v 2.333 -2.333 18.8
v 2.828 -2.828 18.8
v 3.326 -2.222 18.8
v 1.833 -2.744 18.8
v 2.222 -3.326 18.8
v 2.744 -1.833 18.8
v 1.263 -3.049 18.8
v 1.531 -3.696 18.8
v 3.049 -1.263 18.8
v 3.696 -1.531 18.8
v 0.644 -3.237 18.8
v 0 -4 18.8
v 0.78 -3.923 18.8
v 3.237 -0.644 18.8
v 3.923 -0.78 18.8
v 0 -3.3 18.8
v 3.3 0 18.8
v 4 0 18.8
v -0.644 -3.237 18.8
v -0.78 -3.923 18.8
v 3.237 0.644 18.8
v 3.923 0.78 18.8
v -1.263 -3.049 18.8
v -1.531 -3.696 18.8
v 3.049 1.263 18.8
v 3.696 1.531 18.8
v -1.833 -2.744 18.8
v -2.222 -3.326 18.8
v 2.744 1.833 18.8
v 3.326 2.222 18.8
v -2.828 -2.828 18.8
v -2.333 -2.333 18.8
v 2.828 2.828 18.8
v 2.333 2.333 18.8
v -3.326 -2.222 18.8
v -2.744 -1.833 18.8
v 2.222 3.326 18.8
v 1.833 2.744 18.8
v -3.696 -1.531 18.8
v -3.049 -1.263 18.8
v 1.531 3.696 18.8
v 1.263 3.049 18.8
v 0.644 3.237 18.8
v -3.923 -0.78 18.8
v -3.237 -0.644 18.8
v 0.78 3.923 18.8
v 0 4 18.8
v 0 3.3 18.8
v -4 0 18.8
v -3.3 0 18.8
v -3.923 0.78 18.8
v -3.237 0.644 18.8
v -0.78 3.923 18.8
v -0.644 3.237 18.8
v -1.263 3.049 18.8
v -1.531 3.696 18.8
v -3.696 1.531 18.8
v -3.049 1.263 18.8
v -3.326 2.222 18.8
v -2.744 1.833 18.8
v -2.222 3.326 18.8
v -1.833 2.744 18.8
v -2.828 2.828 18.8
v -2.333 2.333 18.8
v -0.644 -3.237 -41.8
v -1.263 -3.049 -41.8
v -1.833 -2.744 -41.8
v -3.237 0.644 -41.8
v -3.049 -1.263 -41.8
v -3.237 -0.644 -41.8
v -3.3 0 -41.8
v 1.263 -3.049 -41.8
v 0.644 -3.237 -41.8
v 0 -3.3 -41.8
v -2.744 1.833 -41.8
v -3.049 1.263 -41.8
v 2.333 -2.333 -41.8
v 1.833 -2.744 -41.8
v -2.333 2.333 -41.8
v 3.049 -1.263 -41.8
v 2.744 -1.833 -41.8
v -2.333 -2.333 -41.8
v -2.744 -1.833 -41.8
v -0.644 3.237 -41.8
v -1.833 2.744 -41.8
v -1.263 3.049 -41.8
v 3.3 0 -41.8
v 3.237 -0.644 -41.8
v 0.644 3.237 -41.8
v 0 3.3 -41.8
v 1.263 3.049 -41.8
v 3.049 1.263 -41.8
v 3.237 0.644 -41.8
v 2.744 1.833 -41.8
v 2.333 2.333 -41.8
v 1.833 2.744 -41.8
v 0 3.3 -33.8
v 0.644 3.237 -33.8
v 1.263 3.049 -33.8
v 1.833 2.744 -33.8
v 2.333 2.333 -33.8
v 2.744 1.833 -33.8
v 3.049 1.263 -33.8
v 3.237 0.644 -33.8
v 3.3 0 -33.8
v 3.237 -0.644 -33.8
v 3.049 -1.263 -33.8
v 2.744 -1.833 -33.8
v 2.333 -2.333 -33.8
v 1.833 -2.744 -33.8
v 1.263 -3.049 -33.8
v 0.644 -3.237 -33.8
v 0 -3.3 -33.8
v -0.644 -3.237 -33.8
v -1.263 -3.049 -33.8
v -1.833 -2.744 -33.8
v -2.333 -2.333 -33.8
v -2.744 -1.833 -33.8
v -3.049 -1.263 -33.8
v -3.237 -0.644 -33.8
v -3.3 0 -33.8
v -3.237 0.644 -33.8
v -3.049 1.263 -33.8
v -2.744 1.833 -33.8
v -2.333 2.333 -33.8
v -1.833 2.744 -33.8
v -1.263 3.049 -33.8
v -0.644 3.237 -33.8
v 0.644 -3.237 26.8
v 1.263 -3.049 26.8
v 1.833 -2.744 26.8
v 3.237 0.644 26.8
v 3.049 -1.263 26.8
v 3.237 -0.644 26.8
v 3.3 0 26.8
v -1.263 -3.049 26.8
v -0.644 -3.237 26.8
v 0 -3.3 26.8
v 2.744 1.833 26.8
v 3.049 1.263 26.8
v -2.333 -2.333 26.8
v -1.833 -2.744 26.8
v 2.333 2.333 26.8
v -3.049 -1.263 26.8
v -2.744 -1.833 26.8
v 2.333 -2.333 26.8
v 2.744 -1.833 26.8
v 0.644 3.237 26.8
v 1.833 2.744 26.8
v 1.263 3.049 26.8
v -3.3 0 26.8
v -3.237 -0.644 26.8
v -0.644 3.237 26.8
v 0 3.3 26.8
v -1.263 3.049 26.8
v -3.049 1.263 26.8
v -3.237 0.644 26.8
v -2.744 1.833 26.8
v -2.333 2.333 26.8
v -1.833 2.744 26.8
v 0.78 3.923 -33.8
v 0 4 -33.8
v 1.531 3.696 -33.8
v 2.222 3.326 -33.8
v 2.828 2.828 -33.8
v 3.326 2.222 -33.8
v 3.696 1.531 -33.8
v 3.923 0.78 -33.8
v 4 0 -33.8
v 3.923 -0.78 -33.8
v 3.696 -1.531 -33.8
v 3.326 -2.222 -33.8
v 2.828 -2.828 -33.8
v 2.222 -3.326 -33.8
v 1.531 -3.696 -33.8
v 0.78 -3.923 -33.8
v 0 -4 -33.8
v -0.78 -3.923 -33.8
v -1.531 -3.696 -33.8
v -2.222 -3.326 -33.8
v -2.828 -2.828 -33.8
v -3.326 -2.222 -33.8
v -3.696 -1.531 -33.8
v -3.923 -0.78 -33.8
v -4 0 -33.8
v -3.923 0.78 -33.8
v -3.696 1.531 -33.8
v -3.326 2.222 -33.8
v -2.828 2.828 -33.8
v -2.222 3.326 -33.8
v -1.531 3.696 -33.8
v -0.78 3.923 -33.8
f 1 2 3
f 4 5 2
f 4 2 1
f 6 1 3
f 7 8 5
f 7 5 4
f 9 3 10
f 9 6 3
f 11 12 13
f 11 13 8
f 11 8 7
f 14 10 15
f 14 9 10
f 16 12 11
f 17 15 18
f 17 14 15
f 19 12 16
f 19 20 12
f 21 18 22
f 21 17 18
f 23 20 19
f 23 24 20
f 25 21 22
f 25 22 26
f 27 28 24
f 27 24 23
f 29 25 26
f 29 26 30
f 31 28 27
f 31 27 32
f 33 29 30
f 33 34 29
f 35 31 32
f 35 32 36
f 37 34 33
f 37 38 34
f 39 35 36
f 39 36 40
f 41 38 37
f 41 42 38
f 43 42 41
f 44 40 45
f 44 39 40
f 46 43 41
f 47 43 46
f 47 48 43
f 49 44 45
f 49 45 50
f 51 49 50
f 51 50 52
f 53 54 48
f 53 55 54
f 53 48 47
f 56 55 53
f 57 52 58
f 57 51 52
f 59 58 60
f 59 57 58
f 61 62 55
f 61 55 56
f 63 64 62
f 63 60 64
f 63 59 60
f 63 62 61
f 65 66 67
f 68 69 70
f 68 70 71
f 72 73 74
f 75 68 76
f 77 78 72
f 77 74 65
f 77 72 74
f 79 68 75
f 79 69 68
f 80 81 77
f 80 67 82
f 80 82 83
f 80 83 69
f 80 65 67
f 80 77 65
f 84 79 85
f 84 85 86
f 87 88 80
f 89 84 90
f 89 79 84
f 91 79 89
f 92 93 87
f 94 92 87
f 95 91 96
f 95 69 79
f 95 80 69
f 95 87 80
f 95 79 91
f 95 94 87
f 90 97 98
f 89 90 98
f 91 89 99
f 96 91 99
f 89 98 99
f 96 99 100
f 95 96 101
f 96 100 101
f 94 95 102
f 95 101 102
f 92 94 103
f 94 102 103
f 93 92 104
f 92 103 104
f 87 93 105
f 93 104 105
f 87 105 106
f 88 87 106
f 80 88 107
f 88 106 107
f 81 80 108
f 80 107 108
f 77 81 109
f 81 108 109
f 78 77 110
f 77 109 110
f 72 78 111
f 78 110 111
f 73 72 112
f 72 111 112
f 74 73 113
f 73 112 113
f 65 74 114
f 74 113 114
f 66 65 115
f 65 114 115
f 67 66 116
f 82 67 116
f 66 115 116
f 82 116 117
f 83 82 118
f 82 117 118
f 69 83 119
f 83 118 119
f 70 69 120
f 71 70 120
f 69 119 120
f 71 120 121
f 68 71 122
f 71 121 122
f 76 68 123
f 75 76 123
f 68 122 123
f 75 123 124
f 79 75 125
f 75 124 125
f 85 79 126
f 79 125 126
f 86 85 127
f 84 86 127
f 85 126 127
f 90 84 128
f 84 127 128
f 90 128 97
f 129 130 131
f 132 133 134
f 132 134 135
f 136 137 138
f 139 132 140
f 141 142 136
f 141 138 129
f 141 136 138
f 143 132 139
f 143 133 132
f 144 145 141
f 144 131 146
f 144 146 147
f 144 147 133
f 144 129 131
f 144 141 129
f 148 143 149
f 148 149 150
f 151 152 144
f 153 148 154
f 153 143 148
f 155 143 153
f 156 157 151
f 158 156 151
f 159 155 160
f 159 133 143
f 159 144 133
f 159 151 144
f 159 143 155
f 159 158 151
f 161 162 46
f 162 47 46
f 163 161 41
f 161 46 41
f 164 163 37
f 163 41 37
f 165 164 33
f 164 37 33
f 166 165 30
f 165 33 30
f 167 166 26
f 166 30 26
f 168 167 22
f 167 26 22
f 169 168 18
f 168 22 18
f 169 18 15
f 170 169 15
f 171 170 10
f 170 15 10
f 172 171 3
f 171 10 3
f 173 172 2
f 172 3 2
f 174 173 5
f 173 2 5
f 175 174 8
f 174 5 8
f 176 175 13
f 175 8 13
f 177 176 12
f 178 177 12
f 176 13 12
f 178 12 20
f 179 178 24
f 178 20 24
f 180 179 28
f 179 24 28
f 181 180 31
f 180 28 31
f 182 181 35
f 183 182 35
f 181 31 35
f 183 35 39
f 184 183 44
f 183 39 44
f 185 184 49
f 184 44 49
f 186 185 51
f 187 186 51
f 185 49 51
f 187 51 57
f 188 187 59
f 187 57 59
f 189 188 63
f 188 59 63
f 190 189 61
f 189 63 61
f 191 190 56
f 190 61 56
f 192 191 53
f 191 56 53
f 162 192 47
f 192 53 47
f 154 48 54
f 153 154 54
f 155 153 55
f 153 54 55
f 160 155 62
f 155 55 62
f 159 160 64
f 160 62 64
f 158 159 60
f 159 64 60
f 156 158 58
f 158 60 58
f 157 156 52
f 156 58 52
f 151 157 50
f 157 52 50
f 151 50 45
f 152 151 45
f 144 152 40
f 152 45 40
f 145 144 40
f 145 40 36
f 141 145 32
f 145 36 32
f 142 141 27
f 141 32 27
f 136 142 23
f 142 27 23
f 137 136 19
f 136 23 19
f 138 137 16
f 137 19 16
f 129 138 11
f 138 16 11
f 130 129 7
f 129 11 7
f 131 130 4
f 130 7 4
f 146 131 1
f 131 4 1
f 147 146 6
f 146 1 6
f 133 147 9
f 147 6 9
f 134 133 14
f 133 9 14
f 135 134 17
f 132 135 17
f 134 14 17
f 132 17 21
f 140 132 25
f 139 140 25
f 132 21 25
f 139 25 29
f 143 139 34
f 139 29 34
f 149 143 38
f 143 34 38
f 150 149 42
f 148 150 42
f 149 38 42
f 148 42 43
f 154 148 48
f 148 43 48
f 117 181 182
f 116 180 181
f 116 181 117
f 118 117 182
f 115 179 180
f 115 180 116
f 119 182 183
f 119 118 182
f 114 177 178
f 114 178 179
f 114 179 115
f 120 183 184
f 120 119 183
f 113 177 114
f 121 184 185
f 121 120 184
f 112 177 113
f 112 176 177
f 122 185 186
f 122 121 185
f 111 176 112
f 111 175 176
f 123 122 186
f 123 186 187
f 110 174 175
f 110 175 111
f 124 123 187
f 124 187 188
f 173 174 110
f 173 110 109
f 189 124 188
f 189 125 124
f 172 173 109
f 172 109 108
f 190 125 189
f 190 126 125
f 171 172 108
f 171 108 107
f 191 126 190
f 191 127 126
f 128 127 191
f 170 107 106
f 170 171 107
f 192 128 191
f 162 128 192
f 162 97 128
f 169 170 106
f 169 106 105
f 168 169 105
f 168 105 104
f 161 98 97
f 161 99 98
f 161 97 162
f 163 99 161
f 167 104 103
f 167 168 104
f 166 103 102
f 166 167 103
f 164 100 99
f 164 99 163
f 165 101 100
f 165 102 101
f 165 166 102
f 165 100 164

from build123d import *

# Parameters (mm, degrees)
SKETCH042_R       = 4
PAD018_DEPTH      = 18.8
SKETCH045_R       = 3.3
PAD019_DEPTH      = 8
SKETCH050_R       = 4
PAD021_DEPTH      = 33.8
CYLINDER003_R     = 3.3
CYLINDER003_DEPTH = 8


with BuildPart() as part:
    # Sketch042 (on DatumPlane) → Pad018 (new body)
    with BuildSketch(Plane(origin=(0, 0, 18.8), x_dir=(0, 1, 0), z_dir=(0, 0, 1))):
        Circle(SKETCH042_R)
    extrude(amount=-PAD018_DEPTH)

    # Sketch045 (on Face2 of Pad018) → Pad019 (join)
    with BuildSketch(Plane(origin=(0, 0, 18.8), x_dir=(0, 1, 0), z_dir=(0, 0, 1))):
        Circle(SKETCH045_R)
    extrude(amount=PAD019_DEPTH)

    # Sketch050 (on Face3 of Pad019) → Pad021 (join)
    with BuildSketch(Plane.YX):
        Circle(SKETCH050_R)
    extrude(amount=PAD021_DEPTH)

    # Cylinder003 → Cylinder003 (join)
    with BuildSketch(Plane.YX.offset(33.8)):
        Circle(CYLINDER003_R)
    extrude(amount=CYLINDER003_DEPTH)


solid = part.part
